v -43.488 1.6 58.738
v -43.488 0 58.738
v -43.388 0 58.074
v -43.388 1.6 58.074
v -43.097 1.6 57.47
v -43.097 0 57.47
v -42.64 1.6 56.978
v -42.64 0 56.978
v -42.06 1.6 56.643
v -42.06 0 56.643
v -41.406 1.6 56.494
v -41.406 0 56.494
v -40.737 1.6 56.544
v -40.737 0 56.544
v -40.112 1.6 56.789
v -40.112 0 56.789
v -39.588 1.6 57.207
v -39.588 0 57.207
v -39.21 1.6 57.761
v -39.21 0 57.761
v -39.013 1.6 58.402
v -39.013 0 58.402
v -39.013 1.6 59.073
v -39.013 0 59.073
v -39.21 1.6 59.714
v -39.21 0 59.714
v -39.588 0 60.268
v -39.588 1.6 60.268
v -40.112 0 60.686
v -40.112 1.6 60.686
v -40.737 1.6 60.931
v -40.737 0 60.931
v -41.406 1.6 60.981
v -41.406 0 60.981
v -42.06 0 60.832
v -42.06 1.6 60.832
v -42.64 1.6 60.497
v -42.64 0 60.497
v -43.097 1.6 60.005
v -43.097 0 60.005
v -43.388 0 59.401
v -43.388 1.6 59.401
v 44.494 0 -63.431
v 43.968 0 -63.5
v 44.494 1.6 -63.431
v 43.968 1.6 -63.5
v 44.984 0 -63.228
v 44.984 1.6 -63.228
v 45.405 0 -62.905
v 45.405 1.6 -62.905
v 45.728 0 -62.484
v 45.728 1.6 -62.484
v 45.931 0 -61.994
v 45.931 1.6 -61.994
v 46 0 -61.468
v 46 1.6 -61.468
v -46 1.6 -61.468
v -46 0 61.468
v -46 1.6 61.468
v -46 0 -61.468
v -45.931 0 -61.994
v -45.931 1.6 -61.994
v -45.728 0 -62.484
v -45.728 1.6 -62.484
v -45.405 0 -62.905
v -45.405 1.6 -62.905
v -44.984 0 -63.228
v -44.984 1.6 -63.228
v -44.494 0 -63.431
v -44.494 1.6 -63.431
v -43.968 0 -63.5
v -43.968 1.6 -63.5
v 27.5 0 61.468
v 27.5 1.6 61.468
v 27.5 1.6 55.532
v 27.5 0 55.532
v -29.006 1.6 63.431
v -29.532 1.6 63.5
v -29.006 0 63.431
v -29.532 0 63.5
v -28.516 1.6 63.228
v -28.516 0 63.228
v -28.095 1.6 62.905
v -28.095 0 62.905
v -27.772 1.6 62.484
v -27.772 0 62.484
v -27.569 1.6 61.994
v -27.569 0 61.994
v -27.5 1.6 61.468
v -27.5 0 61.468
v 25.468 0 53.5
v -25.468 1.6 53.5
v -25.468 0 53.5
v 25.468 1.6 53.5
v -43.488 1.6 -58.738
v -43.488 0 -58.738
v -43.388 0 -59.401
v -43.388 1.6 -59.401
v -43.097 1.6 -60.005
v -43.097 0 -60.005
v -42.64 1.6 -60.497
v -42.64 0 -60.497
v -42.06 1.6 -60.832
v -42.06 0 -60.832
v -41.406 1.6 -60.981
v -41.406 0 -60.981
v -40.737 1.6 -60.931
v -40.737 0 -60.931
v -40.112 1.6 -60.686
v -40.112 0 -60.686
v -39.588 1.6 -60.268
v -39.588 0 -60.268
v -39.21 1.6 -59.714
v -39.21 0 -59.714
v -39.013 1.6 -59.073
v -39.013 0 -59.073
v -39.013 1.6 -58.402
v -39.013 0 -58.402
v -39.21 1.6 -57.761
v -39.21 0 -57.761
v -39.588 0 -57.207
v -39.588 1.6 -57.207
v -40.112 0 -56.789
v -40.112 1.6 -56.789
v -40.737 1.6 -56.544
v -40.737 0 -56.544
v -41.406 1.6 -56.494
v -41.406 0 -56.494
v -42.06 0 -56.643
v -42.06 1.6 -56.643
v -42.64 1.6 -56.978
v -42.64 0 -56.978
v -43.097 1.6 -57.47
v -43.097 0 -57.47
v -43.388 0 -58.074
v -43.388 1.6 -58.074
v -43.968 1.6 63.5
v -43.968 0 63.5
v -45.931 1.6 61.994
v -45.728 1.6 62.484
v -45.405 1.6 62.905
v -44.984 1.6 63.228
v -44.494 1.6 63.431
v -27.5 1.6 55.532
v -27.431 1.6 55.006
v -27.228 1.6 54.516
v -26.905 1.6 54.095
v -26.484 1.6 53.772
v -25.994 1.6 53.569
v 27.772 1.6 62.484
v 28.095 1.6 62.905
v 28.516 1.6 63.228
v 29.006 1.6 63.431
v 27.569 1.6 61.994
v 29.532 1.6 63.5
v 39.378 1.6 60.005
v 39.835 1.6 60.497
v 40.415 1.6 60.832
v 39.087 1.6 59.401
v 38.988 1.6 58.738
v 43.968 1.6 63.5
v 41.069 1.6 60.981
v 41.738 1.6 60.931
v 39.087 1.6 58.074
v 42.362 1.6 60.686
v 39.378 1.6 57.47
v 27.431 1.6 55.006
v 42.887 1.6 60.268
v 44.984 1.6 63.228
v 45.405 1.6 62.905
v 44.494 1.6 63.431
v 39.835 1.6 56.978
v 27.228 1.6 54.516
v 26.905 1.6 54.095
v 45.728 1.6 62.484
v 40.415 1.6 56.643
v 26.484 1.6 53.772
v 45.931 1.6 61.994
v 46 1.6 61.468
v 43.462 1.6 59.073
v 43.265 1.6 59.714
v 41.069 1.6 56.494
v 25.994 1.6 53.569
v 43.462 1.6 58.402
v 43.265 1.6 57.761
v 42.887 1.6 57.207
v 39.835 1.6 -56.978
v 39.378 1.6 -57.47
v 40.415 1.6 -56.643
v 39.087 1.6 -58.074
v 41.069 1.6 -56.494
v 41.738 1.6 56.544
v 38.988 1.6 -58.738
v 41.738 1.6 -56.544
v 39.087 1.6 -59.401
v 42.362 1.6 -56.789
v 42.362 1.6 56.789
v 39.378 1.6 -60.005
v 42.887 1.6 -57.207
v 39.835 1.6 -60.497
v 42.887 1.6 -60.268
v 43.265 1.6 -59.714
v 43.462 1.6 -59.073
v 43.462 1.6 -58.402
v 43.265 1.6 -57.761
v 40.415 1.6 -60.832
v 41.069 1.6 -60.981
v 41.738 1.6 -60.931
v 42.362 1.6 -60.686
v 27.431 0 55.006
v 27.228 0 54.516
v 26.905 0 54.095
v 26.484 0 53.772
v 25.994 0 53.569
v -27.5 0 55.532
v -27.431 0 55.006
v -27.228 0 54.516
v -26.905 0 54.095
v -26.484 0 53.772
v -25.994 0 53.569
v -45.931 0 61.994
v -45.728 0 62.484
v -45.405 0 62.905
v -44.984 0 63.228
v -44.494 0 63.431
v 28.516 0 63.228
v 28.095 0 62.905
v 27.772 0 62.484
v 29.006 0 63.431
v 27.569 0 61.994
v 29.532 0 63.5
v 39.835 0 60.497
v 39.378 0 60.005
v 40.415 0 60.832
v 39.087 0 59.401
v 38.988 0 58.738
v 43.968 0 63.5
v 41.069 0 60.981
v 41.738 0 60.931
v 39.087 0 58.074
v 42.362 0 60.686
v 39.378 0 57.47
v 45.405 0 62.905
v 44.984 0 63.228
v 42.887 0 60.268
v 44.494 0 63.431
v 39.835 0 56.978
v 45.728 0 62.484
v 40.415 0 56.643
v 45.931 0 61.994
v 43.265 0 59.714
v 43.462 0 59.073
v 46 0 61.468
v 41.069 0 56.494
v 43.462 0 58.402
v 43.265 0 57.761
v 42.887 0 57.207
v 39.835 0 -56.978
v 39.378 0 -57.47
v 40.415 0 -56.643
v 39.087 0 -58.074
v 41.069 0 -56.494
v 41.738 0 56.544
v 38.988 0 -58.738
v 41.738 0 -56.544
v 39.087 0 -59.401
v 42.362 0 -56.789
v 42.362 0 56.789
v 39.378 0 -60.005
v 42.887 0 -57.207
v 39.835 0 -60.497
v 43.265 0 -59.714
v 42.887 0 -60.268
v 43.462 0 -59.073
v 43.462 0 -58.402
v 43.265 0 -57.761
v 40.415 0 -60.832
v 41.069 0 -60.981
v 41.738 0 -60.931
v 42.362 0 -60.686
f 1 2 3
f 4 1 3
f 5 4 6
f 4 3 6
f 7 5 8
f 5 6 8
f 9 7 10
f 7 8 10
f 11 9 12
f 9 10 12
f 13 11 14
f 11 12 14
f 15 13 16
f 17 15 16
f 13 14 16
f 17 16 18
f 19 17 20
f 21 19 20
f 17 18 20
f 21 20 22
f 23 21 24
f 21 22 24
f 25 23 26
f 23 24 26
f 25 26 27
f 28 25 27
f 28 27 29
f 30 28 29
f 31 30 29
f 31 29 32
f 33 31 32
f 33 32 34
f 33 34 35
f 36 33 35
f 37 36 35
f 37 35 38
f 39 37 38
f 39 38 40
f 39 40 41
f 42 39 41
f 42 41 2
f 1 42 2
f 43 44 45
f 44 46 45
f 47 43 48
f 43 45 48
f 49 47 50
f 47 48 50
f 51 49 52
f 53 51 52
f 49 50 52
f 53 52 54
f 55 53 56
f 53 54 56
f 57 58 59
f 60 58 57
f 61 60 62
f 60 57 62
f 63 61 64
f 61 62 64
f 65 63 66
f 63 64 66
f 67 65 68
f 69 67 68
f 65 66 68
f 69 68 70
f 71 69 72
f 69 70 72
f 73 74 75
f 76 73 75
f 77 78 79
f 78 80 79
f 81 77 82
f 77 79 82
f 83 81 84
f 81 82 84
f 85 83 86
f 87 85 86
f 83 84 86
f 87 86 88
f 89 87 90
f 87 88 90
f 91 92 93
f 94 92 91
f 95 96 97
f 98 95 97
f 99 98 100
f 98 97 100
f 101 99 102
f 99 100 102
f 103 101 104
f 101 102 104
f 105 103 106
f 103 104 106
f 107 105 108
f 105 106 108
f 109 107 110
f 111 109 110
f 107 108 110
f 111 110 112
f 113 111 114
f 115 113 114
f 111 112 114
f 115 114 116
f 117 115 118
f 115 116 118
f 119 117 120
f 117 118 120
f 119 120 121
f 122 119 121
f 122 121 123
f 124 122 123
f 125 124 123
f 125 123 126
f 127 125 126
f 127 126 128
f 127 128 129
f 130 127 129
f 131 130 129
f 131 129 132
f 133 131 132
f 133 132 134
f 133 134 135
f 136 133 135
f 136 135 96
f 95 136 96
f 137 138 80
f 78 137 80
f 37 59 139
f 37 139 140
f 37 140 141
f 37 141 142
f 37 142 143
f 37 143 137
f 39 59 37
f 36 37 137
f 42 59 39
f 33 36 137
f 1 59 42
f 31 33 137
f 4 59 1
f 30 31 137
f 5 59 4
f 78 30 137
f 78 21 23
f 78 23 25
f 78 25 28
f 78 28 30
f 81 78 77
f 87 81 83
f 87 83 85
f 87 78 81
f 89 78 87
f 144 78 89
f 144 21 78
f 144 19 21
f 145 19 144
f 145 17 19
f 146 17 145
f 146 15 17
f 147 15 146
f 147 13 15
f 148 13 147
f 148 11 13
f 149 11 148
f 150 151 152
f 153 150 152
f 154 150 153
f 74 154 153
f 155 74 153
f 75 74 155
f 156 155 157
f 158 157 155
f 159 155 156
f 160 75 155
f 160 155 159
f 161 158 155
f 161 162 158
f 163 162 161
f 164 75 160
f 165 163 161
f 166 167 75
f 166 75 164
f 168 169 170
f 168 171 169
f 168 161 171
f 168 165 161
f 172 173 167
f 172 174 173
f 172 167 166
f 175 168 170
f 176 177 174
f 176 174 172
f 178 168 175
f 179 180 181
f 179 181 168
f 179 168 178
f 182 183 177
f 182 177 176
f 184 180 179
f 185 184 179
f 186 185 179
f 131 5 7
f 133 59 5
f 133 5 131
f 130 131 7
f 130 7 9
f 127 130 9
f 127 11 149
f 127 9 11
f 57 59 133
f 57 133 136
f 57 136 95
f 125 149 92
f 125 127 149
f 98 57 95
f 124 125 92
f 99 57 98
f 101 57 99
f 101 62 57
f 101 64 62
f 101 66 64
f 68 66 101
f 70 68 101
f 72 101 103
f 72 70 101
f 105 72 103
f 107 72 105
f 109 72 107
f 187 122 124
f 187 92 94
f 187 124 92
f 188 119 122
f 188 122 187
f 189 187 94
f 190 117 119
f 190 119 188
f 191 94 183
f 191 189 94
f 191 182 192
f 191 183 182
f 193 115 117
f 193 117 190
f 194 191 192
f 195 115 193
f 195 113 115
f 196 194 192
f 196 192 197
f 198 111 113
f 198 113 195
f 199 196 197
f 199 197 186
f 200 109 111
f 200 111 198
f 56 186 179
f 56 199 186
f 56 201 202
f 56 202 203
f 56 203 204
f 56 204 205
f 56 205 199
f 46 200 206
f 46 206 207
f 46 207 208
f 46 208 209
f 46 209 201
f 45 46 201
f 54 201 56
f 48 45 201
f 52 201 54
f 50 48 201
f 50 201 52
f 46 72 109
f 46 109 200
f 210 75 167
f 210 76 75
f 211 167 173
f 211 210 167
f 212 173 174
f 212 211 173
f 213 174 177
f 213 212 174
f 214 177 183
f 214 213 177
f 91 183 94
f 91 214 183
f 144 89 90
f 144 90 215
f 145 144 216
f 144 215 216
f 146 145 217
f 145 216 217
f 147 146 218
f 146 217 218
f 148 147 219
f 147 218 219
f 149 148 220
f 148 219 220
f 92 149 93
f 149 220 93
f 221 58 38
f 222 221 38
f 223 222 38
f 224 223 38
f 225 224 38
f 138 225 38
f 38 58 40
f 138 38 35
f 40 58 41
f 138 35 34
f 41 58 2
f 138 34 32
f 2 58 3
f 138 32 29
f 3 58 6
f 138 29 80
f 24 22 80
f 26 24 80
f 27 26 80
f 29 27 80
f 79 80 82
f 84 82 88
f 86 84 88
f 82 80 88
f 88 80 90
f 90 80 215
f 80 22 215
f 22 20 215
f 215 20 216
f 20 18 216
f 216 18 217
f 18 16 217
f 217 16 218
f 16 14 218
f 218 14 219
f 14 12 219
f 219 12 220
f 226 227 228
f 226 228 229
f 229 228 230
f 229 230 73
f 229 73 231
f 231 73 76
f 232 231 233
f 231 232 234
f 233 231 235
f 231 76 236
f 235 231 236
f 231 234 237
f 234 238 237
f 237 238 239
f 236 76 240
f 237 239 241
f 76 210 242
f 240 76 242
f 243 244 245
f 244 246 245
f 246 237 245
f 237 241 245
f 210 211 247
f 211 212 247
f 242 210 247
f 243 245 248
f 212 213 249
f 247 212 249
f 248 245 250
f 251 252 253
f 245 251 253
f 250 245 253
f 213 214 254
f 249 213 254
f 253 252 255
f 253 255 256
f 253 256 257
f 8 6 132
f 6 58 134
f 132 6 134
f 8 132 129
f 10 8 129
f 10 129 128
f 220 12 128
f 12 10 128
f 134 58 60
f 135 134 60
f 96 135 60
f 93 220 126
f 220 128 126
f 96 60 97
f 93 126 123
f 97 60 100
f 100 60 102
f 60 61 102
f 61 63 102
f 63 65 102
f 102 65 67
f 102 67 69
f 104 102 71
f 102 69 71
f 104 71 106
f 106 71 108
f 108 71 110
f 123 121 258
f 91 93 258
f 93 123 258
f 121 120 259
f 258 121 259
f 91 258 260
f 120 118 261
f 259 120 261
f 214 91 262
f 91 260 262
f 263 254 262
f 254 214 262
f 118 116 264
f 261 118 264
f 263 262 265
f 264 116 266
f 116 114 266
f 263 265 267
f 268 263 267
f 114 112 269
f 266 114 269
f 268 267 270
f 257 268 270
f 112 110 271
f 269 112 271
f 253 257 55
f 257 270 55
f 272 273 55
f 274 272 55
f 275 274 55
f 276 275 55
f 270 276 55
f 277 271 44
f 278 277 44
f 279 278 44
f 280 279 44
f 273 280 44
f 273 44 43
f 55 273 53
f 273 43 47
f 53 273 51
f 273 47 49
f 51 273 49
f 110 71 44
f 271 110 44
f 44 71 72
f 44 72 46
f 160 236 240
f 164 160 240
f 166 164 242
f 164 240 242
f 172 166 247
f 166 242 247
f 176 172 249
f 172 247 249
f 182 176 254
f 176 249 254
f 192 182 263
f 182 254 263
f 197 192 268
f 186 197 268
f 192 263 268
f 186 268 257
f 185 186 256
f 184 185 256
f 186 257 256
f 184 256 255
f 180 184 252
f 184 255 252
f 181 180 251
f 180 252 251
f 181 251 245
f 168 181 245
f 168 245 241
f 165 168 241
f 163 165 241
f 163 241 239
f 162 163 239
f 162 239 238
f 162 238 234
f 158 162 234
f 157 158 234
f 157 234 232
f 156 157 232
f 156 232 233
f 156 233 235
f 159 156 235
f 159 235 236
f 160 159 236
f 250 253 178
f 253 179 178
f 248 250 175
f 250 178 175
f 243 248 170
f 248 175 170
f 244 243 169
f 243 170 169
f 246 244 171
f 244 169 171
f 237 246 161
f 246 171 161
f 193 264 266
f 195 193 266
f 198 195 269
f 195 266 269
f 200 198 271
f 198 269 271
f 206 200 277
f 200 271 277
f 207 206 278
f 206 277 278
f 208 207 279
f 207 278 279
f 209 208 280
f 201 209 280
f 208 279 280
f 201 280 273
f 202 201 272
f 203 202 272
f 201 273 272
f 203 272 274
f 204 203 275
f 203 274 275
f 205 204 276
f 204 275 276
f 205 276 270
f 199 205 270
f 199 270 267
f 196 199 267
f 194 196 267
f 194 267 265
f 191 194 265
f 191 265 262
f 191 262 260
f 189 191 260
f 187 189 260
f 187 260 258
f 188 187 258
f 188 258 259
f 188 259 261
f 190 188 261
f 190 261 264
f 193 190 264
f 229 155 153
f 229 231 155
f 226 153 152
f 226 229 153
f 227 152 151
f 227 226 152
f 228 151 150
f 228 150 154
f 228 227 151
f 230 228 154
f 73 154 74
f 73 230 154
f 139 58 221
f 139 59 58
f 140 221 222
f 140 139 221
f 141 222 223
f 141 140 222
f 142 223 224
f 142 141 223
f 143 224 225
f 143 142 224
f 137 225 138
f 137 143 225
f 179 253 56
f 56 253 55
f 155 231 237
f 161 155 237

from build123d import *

# Parameters (mm, degrees)
SKETCH1_W                = 92
SKETCH1_H                = 127
BOSS_EXTRUDE1_DEPTH      = 1.6
M4_CLEARANCE_HOLE1_D     = 4.5
M4_CLEARANCE_HOLE1_DEPTH = 50
M4_CLEARANCE_HOLE1_TIP   = 1.351936393
SKETCH4_W                = 55
SKETCH4_H                = 10
CUT_EXTRUDE1_DEPTH       = 1.6
FILLET1_R                = 2.032


with BuildPart() as part:
    # Sketch1 → Boss-Extrude1 (new body)
    with BuildSketch(Plane(origin=(0, 0, 0), x_dir=(1, 0, 0), z_dir=(0, 1, 0))):
        Rectangle(SKETCH1_W, SKETCH1_H)
    extrude(amount=BOSS_EXTRUDE1_DEPTH)

    # M4 Clearance Hole1
    with Locations(Plane(origin=(0, 1.6, 0), x_dir=(1, 0, 0), z_dir=(0, 1, 0))):
        with Locations((-41.2375, 58.7375), (41.2375, 58.7375), (41.2375, -58.7375), (-41.2375, -58.7375)):
            Hole(M4_CLEARANCE_HOLE1_D / 2, depth=M4_CLEARANCE_HOLE1_DEPTH)
            with Locations((0, 0, -(M4_CLEARANCE_HOLE1_DEPTH + M4_CLEARANCE_HOLE1_TIP / 2))):  # 118° drill point
                Cone(0, M4_CLEARANCE_HOLE1_D / 2, M4_CLEARANCE_HOLE1_TIP, mode=Mode.SUBTRACT)

    # Sketch4 → Cut-Extrude1 (cut)
    with BuildSketch(Plane(origin=(0, 1.6, 0), x_dir=(1, 0, 0), z_dir=(0, 1, 0))):
        with Locations((0, -58.5)):
            Rectangle(SKETCH4_W, SKETCH4_H)
    extrude(amount=-CUT_EXTRUDE1_DEPTH, mode=Mode.SUBTRACT)

    # Fillet1
    fillet1_edges = [part.edges().sort_by_distance(p)[0] for p in [
        (27.5, 0.8, 53.5),
        (27.5, 0.8, 63.5),
        (-27.5, 0.8, 63.5),
        (-27.5, 0.8, 53.5),
        (46, 0.8, 63.5),
        (-46, 0.8, 63.5),
        (-46, 0.8, -63.5),
        (46, 0.8, -63.5),
    ]]
    fillet(fillet1_edges, radius=FILLET1_R)


solid = part.part
